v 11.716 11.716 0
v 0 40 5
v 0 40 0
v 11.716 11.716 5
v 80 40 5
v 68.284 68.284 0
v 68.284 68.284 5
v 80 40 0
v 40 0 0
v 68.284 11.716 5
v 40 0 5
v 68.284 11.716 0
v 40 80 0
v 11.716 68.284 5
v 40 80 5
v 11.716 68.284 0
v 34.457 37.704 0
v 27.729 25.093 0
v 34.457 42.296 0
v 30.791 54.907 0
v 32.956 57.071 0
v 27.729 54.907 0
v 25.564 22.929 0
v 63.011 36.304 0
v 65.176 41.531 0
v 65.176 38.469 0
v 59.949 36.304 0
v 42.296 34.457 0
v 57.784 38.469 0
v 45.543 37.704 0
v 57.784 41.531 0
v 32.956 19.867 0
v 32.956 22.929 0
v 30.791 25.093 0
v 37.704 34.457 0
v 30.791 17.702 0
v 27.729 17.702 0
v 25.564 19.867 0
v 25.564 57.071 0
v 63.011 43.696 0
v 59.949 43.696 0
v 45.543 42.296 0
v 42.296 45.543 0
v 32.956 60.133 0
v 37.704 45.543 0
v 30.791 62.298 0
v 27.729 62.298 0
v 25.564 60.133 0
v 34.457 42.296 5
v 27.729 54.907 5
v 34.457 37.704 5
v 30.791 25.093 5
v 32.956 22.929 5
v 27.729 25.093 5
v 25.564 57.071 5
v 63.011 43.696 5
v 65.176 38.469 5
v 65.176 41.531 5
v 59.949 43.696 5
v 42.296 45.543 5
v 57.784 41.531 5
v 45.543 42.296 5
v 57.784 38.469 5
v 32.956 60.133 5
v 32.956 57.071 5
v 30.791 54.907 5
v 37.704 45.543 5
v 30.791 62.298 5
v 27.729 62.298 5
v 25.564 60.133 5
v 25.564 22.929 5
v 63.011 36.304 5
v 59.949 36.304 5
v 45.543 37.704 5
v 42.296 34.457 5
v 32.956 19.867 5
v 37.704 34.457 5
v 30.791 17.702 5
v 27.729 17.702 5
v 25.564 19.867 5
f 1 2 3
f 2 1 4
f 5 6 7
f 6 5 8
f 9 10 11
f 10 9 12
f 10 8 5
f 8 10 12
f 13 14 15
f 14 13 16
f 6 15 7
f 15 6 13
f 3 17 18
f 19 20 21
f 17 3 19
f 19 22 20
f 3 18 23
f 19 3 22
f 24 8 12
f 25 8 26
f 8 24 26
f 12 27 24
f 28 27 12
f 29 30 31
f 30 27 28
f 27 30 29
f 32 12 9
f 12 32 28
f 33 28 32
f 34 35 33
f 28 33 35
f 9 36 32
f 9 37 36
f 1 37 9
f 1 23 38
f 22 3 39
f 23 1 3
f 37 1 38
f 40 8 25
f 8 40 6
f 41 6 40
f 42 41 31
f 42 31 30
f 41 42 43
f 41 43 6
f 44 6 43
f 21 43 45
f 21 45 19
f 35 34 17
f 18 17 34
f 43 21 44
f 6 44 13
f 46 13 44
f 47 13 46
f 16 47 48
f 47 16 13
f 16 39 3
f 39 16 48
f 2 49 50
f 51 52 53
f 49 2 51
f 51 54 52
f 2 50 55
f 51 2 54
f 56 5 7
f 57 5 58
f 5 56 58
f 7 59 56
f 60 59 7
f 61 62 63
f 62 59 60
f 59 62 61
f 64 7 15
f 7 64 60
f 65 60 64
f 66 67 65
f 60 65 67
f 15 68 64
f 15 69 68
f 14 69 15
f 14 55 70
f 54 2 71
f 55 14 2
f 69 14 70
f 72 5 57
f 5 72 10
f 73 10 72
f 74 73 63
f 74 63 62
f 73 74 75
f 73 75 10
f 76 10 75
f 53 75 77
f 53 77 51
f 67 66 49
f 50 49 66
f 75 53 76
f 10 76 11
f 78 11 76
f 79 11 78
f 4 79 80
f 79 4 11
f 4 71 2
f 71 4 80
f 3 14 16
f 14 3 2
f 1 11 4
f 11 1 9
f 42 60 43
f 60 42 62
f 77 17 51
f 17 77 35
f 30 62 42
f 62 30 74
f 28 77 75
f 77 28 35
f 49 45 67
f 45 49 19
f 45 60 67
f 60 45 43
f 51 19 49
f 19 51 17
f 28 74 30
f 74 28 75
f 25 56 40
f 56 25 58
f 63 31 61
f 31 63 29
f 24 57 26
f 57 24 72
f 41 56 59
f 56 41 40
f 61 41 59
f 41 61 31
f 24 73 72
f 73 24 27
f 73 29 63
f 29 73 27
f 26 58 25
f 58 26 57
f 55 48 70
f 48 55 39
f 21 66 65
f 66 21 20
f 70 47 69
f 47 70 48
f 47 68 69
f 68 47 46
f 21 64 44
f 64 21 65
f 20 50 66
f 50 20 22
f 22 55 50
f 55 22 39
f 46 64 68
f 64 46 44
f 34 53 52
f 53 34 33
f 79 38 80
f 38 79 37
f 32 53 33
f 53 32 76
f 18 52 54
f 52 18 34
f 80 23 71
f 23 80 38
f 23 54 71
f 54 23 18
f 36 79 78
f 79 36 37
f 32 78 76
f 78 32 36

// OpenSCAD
$fn = 32;

// ----------------------------------------------------------------------
// Polygon plate: 8-gon R40, 3 bolt windows
// ----------------------------------------------------------------------

// --- parameters (mm) ---
sides = 8;                // number of polygon sides
plate_r = 40;             // circumscribed radius of the polygon
bore_r = 6;               // centre bore radius
bolts = 3;                // number of bolt windows
ring_r = 21.48;           // bolt-circle radius
bolt_r = 4;               // bolt window radius
plate_t = 5;              // plate thickness, Z (extrusion height)

plate_d = 2 * plate_r;  // circumscribed diameter
bore_d = 2 * bore_r;  // centre bore diameter
bolt_d = 2 * bolt_r;  // bolt window diameter
ring_d = 2 * ring_r;  // bolt-circle diameter

profile = [[80, 40], [68.284, 68.284], [40, 80], [11.716, 68.284], [0, 40], [11.716, 11.716], [40, 0], [68.284, 11.716]];  // primary outline, 8 points, counter clockwise
void_1 = [[45.543, 42.296], [42.296, 45.543], [37.704, 45.543], [34.457, 42.296], [34.457, 37.704], [37.704, 34.457], [42.296, 34.457], [45.543, 37.704]];  // centre bore, 8 points
void_2 = [[65.176, 41.531], [63.011, 43.696], [59.949, 43.696], [57.784, 41.531], [57.784, 38.469], [59.949, 36.304], [63.011, 36.304], [65.176, 38.469]];  // bolt window 1, 8 points
void_3 = [[32.956, 60.133], [30.791, 62.298], [27.729, 62.298], [25.564, 60.133], [25.564, 57.071], [27.729, 54.907], [30.791, 54.907], [32.956, 57.071]];  // bolt window 2, 8 points
void_4 = [[32.956, 22.929], [30.791, 25.093], [27.729, 25.093], [25.564, 22.929], [25.564, 19.867], [27.729, 17.702], [30.791, 17.702], [32.956, 19.867]];  // bolt window 3, 8 points

// --- the one profile operation ---
difference() {
  linear_extrude(height = plate_t) polygon(points = profile);
  translate([0, 0, -1])
    linear_extrude(height = plate_t + 2) polygon(points = void_1);
  translate([0, 0, -1])
    linear_extrude(height = plate_t + 2) polygon(points = void_2);
  translate([0, 0, -1])
    linear_extrude(height = plate_t + 2) polygon(points = void_3);
  translate([0, 0, -1])
    linear_extrude(height = plate_t + 2) polygon(points = void_4);
}
